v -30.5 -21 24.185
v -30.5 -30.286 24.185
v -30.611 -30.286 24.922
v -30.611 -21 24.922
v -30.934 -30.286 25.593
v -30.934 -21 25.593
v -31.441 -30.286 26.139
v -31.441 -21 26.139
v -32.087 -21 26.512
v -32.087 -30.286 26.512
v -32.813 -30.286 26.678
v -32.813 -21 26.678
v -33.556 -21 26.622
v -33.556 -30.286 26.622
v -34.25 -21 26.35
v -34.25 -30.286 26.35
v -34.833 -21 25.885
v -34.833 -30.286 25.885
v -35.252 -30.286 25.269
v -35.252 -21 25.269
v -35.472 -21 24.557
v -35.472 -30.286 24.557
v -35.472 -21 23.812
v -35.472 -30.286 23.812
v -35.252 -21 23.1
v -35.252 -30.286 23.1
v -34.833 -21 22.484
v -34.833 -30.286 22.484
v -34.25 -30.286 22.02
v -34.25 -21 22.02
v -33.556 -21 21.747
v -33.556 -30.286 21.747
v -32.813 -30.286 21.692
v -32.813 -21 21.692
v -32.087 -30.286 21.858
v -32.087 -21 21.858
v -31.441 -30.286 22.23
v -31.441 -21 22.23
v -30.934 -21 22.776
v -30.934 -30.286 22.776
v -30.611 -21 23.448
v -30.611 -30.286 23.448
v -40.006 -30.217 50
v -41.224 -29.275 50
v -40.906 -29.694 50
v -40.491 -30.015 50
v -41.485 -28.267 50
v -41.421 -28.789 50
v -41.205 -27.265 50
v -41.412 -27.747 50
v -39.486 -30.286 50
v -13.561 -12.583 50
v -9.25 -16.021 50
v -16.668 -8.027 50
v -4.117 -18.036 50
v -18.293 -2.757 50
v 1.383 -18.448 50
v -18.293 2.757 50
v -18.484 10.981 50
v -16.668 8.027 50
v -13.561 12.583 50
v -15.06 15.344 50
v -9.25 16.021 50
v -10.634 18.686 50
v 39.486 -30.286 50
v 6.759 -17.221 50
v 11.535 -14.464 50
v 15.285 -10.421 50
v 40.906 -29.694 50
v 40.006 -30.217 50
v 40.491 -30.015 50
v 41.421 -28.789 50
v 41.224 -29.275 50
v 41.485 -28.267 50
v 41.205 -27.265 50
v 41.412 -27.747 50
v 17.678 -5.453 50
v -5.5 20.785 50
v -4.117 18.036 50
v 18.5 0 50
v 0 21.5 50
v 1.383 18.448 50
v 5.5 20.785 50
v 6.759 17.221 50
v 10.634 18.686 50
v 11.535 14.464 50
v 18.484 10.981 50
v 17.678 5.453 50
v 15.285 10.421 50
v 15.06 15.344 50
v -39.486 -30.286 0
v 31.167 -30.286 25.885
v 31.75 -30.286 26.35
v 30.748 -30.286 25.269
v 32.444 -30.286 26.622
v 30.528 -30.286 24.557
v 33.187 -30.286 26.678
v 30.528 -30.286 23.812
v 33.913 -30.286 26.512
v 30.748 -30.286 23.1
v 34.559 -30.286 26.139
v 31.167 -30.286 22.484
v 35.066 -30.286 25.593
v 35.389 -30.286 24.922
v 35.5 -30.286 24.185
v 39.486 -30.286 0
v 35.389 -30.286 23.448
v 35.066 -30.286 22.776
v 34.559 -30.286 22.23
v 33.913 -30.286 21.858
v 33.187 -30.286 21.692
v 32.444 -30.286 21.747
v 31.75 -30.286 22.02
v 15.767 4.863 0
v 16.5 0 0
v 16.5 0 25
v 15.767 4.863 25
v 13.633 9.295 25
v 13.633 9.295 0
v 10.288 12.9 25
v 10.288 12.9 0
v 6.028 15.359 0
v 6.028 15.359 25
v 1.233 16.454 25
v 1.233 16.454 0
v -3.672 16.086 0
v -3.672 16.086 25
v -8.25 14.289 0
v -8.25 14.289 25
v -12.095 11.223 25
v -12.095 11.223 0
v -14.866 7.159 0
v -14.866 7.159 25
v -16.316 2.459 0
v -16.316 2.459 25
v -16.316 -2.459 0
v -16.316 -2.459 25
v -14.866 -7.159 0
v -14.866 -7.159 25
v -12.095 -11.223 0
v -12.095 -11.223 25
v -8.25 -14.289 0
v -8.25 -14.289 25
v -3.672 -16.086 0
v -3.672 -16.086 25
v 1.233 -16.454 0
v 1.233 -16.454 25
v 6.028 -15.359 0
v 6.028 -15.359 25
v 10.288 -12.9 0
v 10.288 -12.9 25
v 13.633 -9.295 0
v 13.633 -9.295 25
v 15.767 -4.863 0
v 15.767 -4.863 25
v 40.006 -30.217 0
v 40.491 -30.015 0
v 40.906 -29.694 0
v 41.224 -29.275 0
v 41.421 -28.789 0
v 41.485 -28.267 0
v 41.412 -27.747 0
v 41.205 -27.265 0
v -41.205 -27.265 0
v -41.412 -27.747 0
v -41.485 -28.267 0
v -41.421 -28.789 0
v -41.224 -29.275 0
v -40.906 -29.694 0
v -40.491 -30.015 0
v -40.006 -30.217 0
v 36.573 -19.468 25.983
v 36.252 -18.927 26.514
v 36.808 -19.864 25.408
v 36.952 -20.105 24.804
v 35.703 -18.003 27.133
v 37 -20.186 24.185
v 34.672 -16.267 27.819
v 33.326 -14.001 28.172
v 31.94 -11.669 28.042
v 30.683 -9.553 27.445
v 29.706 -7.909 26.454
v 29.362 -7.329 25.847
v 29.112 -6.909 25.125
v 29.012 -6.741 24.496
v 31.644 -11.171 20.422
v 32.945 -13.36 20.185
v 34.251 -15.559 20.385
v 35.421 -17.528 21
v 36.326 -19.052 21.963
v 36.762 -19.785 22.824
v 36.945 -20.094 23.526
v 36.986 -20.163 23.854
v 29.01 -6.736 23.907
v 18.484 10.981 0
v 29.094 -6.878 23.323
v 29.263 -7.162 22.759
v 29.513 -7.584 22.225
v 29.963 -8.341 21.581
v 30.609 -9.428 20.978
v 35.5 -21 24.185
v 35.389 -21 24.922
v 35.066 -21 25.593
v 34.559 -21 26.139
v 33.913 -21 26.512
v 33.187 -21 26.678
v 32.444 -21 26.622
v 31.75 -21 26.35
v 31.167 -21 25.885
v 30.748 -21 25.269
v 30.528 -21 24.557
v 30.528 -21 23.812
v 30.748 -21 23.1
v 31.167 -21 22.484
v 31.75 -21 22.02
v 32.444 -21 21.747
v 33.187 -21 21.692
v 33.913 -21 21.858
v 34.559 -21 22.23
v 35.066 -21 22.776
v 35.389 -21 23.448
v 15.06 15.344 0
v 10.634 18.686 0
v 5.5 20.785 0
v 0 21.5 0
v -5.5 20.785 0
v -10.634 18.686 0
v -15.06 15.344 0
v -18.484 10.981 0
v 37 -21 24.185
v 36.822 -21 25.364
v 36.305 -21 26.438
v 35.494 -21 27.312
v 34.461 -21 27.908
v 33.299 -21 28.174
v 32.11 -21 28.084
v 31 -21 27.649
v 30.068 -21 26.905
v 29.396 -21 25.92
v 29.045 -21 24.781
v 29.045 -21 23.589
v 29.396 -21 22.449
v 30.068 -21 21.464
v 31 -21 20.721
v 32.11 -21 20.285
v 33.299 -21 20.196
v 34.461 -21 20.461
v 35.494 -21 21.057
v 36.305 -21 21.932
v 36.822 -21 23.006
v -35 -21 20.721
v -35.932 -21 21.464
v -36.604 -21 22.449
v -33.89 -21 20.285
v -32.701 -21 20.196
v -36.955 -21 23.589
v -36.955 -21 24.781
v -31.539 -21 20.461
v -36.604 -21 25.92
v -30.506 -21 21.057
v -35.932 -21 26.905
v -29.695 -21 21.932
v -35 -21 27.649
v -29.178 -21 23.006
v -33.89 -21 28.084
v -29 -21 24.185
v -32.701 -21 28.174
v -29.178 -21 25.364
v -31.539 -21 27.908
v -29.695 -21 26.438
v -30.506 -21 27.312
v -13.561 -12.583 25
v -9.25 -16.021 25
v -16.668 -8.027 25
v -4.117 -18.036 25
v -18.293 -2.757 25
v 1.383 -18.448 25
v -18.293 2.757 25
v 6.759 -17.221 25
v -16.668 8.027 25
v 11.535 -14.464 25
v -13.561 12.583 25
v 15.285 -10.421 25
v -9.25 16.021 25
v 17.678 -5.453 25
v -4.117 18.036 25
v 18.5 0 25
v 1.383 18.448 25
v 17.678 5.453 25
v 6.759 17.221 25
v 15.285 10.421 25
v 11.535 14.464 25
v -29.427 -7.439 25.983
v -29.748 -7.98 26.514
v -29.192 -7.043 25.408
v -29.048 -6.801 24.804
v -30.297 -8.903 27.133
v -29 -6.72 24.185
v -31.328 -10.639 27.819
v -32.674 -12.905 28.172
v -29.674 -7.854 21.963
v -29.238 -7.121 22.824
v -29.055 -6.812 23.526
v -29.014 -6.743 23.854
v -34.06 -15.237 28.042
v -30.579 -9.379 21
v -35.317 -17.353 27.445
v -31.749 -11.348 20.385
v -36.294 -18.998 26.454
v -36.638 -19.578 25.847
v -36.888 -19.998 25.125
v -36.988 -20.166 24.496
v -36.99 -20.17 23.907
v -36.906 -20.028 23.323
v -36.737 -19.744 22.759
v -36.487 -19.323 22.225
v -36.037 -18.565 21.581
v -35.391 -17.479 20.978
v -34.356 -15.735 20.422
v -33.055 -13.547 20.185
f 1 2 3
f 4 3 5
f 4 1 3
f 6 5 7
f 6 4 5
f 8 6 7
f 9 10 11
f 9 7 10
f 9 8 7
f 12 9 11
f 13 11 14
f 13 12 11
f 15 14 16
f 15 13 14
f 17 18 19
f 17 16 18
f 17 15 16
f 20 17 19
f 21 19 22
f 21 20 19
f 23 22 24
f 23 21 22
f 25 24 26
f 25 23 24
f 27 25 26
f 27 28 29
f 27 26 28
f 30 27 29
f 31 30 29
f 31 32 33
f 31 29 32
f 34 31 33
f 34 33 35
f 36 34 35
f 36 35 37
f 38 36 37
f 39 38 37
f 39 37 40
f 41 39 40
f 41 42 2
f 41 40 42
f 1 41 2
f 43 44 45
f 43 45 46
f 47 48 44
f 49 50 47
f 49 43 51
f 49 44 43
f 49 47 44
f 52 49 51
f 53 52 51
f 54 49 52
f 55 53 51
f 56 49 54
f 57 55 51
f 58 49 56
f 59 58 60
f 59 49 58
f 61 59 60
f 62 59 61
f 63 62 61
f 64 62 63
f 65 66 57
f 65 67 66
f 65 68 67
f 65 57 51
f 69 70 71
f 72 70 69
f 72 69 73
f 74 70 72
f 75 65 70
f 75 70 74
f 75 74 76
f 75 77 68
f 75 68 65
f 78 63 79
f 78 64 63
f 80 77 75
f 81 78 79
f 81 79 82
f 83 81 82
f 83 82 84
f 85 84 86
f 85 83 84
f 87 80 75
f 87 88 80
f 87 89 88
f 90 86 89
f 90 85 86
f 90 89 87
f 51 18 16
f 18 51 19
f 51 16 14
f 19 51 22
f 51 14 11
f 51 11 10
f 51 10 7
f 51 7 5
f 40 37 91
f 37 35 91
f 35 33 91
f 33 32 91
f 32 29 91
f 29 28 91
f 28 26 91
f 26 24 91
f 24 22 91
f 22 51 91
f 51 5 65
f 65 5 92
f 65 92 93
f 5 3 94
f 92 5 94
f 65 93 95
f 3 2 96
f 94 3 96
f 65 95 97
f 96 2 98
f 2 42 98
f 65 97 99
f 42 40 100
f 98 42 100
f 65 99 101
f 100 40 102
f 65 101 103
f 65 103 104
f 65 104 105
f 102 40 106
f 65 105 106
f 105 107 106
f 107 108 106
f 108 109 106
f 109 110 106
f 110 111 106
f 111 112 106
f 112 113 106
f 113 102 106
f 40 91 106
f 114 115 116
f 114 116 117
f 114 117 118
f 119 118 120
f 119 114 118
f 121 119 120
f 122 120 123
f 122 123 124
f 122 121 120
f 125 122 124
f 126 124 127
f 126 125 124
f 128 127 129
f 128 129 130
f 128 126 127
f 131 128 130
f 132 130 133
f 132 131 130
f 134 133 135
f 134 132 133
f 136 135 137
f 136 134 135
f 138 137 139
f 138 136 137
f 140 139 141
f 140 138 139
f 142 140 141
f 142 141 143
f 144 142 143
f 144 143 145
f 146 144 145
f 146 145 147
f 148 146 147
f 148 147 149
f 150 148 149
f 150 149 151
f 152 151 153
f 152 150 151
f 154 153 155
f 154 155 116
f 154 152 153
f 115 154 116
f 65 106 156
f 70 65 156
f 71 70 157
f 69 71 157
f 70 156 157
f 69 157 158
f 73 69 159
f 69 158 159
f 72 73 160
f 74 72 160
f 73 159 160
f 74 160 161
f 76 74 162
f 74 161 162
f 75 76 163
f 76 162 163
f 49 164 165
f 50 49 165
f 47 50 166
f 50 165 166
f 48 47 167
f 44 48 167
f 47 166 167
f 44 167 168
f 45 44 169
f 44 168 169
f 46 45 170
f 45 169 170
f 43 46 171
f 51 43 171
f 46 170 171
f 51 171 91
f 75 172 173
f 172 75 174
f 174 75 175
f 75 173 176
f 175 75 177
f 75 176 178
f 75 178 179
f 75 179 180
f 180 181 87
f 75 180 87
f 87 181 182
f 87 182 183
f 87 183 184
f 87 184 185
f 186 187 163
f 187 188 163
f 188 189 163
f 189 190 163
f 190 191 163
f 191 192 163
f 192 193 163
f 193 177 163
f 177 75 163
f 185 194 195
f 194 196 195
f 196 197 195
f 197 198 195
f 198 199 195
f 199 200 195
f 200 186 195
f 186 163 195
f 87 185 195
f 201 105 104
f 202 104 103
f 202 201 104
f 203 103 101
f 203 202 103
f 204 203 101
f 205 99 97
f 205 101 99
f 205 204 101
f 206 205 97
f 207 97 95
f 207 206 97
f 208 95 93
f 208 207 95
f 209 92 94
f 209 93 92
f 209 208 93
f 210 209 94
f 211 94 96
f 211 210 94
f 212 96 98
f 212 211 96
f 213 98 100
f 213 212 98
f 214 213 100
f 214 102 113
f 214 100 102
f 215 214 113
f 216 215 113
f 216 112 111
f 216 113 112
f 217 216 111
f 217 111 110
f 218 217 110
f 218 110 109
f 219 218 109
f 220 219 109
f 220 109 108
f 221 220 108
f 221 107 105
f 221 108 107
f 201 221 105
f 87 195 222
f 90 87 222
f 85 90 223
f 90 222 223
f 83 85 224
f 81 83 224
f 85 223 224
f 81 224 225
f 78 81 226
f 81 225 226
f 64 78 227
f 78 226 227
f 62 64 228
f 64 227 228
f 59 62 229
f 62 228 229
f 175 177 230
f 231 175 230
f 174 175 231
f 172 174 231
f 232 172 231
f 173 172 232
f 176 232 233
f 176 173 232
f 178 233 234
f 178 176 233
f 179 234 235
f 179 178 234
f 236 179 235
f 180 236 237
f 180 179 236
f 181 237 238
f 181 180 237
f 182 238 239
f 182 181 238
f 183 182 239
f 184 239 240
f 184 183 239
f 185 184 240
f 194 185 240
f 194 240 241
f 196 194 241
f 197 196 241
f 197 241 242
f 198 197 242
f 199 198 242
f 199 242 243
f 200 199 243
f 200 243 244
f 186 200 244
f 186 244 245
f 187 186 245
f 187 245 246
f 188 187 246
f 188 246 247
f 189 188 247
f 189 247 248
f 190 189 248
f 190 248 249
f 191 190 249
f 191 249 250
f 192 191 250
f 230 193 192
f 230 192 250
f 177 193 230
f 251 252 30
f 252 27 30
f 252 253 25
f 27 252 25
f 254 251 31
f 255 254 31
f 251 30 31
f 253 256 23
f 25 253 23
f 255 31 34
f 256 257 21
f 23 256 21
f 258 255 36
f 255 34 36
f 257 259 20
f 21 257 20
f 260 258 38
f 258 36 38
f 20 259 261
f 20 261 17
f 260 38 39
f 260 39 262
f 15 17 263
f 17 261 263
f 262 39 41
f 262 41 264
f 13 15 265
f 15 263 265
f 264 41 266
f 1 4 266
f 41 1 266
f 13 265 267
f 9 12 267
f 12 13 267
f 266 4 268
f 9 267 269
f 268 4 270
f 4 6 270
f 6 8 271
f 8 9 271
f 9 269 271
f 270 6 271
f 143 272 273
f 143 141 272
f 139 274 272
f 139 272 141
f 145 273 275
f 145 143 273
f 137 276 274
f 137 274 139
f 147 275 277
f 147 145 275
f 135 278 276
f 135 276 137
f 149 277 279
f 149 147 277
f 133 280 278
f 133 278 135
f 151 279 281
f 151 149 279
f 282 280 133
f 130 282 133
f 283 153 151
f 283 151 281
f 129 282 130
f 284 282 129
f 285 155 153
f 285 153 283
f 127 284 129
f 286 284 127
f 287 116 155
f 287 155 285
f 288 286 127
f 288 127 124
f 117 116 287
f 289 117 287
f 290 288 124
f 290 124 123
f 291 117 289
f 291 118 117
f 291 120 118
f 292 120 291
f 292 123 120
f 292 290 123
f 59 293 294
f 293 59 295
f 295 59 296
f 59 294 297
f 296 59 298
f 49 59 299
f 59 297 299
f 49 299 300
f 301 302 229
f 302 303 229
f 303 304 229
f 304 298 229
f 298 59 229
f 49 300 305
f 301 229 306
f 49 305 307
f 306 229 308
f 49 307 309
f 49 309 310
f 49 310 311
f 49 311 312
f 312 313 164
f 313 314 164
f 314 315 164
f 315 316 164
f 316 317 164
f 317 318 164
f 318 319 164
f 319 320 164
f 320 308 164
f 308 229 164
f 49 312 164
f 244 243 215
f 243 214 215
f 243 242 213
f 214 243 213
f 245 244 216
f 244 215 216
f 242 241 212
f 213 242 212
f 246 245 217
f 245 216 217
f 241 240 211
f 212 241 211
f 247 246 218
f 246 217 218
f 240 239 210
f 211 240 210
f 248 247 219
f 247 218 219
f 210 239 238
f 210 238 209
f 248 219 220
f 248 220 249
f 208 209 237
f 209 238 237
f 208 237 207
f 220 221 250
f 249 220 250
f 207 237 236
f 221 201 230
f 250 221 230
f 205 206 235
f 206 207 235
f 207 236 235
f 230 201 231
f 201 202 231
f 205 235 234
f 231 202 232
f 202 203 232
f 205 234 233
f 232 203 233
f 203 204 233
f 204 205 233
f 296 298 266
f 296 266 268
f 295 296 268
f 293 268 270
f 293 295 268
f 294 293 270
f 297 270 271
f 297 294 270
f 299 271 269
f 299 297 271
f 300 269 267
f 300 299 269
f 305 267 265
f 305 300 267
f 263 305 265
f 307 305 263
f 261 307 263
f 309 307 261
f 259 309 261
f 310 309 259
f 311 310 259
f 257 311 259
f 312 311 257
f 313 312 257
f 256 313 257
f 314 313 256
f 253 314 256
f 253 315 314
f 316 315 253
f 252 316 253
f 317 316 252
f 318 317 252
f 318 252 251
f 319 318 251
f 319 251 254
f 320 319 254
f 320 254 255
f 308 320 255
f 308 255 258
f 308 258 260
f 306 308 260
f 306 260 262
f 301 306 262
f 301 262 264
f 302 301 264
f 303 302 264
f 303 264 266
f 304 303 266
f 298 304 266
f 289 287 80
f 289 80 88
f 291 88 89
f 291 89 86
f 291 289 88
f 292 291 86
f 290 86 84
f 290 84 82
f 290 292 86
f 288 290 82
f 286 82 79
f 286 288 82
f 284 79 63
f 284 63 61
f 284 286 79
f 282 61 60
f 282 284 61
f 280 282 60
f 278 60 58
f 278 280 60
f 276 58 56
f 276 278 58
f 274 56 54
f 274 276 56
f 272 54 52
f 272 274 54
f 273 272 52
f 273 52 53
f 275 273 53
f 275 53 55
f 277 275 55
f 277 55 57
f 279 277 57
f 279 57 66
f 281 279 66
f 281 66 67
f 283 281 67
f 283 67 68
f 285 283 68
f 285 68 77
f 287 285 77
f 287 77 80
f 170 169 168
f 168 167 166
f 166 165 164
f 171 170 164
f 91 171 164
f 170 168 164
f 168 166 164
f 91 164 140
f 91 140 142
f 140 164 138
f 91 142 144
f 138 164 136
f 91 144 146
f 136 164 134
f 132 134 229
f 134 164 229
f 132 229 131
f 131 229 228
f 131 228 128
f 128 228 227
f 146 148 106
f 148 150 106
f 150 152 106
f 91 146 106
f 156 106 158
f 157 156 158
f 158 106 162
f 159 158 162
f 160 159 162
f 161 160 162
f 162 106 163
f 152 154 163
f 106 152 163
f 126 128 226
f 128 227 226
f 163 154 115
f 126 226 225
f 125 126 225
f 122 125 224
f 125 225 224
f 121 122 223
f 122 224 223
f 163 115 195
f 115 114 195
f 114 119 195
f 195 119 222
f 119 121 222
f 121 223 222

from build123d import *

# Parameters (mm, degrees)
F0_R     = 18.5
F1_DEPTH = 50
F0_R_2   = 16.5
F2_DEPTH = 25
F3_R     = 2.5
F4_DEPTH = 35
F3_R_2   = 4
F5_DEPTH = 21


with BuildPart() as f1:
    # F0 (on Top) → F1 (new body)
    with BuildSketch(Plane.XY):
        with BuildLine():
            ThreePointArc((18.484245, 10.981015), (20.732357, 5.693801), (21.5, 0))
            ThreePointArc((21.5, 0), (-5.693801, -20.732357), (-18.484245, 10.981015))
            Line((-18.484245, 10.981015), (-41.20501, -27.264646))
            ThreePointArc((-41.20501, -27.264646), (-41.223789, -29.275332), (-39.485546, -30.286135))
            Line((-39.485546, -30.286135), (0, -30.286135))
            Line((0, -30.286135), (39.485546, -30.286135))
            ThreePointArc((39.485546, -30.286135), (41.223789, -29.275332), (41.20501, -27.264646))
            Line((41.20501, -27.264646), (18.484245, 10.981015))
        make_face()
        with BuildLine():
            ThreePointArc((-18.484245, 10.981015), (-5.693801, -20.732357), (21.5, 0))
            ThreePointArc((21.5, 0), (20.732357, 5.693801), (18.484245, 10.981015))
            ThreePointArc((18.484245, 10.981015), (0, 21.5), (-18.484245, 10.981015))
        make_face()
        Circle(F0_R, mode=Mode.SUBTRACT)
    extrude(amount=F1_DEPTH)

    # F0 (on Top) → F2 (join)
    with BuildSketch(Plane.XY):
        Circle(F0_R)
        Circle(F0_R_2, mode=Mode.SUBTRACT)
    extrude(amount=F2_DEPTH)

    # F3 (on Front) → F4 (cut)
    with BuildSketch(Plane.XZ):
        with Locations((33, 24.184783)):
            Circle(F3_R)
        with Locations((-33, 24.184783)):
            Circle(F3_R)
    extrude(amount=F4_DEPTH, mode=Mode.SUBTRACT)

    # F3 (on Front) → F5 (cut)
    with BuildSketch(Plane.XZ):
        with Locations((33, 24.184783)):
            Circle(F3_R_2)
        with Locations((33, 24.184783)):
            Circle(F3_R, mode=Mode.SUBTRACT)
        with Locations((-33, 24.184783)):
            Circle(F3_R_2)
        with Locations((-33, 24.184783)):
            Circle(F3_R, mode=Mode.SUBTRACT)
    extrude(amount=F5_DEPTH, mode=Mode.SUBTRACT)


solid = f1.part
